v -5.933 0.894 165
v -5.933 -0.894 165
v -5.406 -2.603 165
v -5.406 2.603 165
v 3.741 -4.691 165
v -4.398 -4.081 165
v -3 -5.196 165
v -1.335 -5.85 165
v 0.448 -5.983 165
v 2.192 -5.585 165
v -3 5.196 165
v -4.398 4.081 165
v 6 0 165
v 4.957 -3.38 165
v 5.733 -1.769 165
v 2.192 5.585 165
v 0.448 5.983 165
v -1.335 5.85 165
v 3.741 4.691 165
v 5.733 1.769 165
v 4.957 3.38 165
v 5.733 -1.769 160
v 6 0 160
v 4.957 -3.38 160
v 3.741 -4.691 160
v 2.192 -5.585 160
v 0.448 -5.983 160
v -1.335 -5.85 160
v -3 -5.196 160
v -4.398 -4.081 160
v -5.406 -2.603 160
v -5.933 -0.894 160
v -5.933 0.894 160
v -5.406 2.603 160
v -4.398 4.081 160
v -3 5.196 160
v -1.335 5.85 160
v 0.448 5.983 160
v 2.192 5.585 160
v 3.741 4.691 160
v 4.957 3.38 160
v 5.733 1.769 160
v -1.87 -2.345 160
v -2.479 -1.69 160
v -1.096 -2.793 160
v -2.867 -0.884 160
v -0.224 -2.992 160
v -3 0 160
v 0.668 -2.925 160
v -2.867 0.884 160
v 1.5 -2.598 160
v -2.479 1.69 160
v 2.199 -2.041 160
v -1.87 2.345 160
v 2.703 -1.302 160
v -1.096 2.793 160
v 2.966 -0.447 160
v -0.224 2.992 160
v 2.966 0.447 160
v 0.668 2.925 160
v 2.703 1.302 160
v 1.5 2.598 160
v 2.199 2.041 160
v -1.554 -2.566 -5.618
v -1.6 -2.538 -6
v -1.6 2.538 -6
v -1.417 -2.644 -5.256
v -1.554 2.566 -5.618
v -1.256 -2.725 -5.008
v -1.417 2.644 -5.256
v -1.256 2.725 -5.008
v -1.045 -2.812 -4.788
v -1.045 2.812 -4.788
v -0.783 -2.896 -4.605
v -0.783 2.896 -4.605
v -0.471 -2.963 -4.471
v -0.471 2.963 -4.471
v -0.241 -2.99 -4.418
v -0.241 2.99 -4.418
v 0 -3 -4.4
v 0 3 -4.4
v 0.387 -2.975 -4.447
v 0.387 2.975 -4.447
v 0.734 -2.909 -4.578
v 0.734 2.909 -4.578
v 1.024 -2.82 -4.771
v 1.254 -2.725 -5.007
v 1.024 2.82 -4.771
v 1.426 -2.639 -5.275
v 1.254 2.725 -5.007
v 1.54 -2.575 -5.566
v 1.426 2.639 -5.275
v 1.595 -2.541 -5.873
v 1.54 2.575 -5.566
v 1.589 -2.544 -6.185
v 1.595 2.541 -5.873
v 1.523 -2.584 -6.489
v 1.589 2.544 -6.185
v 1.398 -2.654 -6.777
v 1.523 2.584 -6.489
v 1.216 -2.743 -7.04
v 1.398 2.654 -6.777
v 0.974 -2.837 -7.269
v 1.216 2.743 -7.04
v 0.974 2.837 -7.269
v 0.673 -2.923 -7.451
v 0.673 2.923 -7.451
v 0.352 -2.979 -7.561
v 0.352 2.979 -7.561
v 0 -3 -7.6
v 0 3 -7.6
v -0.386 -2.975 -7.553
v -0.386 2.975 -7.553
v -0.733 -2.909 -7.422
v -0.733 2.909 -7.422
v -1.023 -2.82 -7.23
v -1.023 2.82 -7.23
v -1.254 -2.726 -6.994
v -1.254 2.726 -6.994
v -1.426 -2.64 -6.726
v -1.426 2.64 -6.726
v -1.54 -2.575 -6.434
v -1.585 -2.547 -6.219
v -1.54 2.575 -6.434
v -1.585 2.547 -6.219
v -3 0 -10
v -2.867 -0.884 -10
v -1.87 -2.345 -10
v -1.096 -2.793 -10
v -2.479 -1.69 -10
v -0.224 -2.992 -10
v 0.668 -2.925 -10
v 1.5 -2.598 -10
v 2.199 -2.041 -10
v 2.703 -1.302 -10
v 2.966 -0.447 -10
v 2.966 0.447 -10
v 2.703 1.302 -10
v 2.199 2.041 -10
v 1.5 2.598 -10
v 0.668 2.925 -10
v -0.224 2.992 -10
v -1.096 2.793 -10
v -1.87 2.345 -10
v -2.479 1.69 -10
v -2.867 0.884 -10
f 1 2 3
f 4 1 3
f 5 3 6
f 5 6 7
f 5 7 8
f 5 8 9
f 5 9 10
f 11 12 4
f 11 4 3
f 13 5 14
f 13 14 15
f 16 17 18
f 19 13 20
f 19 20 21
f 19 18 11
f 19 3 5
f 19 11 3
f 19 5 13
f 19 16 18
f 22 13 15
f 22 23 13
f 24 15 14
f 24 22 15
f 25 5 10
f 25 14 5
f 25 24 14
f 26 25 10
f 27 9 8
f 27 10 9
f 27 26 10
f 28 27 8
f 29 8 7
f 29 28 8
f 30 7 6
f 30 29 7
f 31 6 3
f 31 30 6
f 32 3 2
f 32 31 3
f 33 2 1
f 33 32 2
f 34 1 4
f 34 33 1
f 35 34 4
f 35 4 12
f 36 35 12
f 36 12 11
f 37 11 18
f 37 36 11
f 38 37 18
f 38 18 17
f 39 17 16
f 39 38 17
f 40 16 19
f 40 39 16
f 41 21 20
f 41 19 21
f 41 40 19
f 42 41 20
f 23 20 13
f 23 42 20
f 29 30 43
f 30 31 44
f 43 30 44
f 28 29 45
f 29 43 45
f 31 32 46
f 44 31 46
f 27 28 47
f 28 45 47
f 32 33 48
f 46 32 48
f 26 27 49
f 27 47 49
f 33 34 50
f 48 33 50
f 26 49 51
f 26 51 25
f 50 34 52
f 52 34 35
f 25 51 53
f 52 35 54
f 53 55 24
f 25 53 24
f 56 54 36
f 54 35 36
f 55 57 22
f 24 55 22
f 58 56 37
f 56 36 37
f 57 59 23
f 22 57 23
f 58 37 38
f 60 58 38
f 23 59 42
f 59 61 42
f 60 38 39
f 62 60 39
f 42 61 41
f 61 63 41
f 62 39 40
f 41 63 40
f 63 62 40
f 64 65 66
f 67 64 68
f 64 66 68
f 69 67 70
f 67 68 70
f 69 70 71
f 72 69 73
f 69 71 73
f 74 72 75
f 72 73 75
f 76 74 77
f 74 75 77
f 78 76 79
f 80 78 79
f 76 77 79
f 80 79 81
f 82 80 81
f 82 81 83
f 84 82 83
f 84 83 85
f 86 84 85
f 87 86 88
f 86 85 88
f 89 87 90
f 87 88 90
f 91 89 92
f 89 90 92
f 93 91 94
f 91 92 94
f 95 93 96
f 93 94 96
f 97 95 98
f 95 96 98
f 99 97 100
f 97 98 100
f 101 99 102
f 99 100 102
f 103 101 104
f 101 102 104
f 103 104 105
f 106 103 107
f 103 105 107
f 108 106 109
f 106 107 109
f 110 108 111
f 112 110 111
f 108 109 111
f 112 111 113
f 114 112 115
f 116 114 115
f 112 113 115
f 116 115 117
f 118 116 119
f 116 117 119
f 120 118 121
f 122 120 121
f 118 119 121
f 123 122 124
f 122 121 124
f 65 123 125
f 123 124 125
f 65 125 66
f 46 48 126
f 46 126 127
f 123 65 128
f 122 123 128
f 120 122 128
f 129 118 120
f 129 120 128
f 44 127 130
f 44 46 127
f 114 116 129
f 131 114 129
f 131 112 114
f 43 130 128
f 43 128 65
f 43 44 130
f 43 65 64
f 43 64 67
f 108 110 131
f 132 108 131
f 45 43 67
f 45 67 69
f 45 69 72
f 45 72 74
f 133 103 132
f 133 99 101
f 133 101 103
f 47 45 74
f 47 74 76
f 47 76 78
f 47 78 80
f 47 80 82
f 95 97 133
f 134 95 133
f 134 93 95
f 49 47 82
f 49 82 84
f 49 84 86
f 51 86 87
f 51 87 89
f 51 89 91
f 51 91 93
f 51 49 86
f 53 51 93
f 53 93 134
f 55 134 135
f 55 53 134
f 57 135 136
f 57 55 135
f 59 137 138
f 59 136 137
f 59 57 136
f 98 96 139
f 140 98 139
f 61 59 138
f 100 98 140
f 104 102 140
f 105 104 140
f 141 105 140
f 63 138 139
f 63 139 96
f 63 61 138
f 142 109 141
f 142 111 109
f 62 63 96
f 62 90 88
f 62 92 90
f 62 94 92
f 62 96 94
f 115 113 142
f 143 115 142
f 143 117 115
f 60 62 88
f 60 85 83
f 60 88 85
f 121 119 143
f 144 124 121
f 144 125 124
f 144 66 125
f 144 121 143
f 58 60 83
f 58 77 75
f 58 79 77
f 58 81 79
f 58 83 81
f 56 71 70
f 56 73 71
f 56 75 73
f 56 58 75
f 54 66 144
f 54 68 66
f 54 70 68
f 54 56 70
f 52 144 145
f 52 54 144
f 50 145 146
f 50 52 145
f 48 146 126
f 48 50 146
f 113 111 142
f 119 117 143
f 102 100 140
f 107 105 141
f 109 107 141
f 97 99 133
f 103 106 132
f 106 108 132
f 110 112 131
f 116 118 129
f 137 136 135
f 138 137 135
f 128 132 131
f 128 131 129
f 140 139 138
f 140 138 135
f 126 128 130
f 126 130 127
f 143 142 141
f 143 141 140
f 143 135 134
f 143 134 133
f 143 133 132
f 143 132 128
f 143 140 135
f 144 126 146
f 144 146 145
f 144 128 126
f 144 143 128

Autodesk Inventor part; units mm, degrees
ref_plane "YZ Plane" through (0, 0, 0) normal (1, 0, 0) x (0, 1, 0)
ref_plane "XZ Plane" through (0, 0, 0) normal (0, 1, 0) x (-1, 0, 0)
ref_plane "Arbeitsebene1" through (0, 0, 160) normal (0, 0, 1) x (1, 0, 0)
sketch "Skizze2" plane through (0, 0, 160) normal (0, 0, 1) x (1, 0, 0)
  circle A0 centre (0, 0) radius 6
  dimension "d3" = 12
extrude "Extrusion2" add sketch "Skizze2" along normal blind 5
sketch "Skizze3" plane through (0, 0, 160) normal (0, 0, -1) x (-1, 0, 0)
  circle A0 centre (0, 0) radius 3
  dimension "d6" = 6
extrude "Extrusion3" add sketch "Skizze3" along normal blind 170
sketch "Skizze4" plane through (0, 0, 0) normal (0, 1, 0) x (-1, 0, 0)
  line L0 (-3, -10) -> (3, -10) projected
  line L1 (0, -10) -> (0, 4)
  circle A0 centre (0, -6) radius 1.6
  point P0 (0, 0)
  dimension "d9" = 14
  dimension "d10" = 3.2
extrude "Extrusion4" cut sketch "Skizze4" along normal mid plane 6
properties part number "Bolzen fuer Ruder"
